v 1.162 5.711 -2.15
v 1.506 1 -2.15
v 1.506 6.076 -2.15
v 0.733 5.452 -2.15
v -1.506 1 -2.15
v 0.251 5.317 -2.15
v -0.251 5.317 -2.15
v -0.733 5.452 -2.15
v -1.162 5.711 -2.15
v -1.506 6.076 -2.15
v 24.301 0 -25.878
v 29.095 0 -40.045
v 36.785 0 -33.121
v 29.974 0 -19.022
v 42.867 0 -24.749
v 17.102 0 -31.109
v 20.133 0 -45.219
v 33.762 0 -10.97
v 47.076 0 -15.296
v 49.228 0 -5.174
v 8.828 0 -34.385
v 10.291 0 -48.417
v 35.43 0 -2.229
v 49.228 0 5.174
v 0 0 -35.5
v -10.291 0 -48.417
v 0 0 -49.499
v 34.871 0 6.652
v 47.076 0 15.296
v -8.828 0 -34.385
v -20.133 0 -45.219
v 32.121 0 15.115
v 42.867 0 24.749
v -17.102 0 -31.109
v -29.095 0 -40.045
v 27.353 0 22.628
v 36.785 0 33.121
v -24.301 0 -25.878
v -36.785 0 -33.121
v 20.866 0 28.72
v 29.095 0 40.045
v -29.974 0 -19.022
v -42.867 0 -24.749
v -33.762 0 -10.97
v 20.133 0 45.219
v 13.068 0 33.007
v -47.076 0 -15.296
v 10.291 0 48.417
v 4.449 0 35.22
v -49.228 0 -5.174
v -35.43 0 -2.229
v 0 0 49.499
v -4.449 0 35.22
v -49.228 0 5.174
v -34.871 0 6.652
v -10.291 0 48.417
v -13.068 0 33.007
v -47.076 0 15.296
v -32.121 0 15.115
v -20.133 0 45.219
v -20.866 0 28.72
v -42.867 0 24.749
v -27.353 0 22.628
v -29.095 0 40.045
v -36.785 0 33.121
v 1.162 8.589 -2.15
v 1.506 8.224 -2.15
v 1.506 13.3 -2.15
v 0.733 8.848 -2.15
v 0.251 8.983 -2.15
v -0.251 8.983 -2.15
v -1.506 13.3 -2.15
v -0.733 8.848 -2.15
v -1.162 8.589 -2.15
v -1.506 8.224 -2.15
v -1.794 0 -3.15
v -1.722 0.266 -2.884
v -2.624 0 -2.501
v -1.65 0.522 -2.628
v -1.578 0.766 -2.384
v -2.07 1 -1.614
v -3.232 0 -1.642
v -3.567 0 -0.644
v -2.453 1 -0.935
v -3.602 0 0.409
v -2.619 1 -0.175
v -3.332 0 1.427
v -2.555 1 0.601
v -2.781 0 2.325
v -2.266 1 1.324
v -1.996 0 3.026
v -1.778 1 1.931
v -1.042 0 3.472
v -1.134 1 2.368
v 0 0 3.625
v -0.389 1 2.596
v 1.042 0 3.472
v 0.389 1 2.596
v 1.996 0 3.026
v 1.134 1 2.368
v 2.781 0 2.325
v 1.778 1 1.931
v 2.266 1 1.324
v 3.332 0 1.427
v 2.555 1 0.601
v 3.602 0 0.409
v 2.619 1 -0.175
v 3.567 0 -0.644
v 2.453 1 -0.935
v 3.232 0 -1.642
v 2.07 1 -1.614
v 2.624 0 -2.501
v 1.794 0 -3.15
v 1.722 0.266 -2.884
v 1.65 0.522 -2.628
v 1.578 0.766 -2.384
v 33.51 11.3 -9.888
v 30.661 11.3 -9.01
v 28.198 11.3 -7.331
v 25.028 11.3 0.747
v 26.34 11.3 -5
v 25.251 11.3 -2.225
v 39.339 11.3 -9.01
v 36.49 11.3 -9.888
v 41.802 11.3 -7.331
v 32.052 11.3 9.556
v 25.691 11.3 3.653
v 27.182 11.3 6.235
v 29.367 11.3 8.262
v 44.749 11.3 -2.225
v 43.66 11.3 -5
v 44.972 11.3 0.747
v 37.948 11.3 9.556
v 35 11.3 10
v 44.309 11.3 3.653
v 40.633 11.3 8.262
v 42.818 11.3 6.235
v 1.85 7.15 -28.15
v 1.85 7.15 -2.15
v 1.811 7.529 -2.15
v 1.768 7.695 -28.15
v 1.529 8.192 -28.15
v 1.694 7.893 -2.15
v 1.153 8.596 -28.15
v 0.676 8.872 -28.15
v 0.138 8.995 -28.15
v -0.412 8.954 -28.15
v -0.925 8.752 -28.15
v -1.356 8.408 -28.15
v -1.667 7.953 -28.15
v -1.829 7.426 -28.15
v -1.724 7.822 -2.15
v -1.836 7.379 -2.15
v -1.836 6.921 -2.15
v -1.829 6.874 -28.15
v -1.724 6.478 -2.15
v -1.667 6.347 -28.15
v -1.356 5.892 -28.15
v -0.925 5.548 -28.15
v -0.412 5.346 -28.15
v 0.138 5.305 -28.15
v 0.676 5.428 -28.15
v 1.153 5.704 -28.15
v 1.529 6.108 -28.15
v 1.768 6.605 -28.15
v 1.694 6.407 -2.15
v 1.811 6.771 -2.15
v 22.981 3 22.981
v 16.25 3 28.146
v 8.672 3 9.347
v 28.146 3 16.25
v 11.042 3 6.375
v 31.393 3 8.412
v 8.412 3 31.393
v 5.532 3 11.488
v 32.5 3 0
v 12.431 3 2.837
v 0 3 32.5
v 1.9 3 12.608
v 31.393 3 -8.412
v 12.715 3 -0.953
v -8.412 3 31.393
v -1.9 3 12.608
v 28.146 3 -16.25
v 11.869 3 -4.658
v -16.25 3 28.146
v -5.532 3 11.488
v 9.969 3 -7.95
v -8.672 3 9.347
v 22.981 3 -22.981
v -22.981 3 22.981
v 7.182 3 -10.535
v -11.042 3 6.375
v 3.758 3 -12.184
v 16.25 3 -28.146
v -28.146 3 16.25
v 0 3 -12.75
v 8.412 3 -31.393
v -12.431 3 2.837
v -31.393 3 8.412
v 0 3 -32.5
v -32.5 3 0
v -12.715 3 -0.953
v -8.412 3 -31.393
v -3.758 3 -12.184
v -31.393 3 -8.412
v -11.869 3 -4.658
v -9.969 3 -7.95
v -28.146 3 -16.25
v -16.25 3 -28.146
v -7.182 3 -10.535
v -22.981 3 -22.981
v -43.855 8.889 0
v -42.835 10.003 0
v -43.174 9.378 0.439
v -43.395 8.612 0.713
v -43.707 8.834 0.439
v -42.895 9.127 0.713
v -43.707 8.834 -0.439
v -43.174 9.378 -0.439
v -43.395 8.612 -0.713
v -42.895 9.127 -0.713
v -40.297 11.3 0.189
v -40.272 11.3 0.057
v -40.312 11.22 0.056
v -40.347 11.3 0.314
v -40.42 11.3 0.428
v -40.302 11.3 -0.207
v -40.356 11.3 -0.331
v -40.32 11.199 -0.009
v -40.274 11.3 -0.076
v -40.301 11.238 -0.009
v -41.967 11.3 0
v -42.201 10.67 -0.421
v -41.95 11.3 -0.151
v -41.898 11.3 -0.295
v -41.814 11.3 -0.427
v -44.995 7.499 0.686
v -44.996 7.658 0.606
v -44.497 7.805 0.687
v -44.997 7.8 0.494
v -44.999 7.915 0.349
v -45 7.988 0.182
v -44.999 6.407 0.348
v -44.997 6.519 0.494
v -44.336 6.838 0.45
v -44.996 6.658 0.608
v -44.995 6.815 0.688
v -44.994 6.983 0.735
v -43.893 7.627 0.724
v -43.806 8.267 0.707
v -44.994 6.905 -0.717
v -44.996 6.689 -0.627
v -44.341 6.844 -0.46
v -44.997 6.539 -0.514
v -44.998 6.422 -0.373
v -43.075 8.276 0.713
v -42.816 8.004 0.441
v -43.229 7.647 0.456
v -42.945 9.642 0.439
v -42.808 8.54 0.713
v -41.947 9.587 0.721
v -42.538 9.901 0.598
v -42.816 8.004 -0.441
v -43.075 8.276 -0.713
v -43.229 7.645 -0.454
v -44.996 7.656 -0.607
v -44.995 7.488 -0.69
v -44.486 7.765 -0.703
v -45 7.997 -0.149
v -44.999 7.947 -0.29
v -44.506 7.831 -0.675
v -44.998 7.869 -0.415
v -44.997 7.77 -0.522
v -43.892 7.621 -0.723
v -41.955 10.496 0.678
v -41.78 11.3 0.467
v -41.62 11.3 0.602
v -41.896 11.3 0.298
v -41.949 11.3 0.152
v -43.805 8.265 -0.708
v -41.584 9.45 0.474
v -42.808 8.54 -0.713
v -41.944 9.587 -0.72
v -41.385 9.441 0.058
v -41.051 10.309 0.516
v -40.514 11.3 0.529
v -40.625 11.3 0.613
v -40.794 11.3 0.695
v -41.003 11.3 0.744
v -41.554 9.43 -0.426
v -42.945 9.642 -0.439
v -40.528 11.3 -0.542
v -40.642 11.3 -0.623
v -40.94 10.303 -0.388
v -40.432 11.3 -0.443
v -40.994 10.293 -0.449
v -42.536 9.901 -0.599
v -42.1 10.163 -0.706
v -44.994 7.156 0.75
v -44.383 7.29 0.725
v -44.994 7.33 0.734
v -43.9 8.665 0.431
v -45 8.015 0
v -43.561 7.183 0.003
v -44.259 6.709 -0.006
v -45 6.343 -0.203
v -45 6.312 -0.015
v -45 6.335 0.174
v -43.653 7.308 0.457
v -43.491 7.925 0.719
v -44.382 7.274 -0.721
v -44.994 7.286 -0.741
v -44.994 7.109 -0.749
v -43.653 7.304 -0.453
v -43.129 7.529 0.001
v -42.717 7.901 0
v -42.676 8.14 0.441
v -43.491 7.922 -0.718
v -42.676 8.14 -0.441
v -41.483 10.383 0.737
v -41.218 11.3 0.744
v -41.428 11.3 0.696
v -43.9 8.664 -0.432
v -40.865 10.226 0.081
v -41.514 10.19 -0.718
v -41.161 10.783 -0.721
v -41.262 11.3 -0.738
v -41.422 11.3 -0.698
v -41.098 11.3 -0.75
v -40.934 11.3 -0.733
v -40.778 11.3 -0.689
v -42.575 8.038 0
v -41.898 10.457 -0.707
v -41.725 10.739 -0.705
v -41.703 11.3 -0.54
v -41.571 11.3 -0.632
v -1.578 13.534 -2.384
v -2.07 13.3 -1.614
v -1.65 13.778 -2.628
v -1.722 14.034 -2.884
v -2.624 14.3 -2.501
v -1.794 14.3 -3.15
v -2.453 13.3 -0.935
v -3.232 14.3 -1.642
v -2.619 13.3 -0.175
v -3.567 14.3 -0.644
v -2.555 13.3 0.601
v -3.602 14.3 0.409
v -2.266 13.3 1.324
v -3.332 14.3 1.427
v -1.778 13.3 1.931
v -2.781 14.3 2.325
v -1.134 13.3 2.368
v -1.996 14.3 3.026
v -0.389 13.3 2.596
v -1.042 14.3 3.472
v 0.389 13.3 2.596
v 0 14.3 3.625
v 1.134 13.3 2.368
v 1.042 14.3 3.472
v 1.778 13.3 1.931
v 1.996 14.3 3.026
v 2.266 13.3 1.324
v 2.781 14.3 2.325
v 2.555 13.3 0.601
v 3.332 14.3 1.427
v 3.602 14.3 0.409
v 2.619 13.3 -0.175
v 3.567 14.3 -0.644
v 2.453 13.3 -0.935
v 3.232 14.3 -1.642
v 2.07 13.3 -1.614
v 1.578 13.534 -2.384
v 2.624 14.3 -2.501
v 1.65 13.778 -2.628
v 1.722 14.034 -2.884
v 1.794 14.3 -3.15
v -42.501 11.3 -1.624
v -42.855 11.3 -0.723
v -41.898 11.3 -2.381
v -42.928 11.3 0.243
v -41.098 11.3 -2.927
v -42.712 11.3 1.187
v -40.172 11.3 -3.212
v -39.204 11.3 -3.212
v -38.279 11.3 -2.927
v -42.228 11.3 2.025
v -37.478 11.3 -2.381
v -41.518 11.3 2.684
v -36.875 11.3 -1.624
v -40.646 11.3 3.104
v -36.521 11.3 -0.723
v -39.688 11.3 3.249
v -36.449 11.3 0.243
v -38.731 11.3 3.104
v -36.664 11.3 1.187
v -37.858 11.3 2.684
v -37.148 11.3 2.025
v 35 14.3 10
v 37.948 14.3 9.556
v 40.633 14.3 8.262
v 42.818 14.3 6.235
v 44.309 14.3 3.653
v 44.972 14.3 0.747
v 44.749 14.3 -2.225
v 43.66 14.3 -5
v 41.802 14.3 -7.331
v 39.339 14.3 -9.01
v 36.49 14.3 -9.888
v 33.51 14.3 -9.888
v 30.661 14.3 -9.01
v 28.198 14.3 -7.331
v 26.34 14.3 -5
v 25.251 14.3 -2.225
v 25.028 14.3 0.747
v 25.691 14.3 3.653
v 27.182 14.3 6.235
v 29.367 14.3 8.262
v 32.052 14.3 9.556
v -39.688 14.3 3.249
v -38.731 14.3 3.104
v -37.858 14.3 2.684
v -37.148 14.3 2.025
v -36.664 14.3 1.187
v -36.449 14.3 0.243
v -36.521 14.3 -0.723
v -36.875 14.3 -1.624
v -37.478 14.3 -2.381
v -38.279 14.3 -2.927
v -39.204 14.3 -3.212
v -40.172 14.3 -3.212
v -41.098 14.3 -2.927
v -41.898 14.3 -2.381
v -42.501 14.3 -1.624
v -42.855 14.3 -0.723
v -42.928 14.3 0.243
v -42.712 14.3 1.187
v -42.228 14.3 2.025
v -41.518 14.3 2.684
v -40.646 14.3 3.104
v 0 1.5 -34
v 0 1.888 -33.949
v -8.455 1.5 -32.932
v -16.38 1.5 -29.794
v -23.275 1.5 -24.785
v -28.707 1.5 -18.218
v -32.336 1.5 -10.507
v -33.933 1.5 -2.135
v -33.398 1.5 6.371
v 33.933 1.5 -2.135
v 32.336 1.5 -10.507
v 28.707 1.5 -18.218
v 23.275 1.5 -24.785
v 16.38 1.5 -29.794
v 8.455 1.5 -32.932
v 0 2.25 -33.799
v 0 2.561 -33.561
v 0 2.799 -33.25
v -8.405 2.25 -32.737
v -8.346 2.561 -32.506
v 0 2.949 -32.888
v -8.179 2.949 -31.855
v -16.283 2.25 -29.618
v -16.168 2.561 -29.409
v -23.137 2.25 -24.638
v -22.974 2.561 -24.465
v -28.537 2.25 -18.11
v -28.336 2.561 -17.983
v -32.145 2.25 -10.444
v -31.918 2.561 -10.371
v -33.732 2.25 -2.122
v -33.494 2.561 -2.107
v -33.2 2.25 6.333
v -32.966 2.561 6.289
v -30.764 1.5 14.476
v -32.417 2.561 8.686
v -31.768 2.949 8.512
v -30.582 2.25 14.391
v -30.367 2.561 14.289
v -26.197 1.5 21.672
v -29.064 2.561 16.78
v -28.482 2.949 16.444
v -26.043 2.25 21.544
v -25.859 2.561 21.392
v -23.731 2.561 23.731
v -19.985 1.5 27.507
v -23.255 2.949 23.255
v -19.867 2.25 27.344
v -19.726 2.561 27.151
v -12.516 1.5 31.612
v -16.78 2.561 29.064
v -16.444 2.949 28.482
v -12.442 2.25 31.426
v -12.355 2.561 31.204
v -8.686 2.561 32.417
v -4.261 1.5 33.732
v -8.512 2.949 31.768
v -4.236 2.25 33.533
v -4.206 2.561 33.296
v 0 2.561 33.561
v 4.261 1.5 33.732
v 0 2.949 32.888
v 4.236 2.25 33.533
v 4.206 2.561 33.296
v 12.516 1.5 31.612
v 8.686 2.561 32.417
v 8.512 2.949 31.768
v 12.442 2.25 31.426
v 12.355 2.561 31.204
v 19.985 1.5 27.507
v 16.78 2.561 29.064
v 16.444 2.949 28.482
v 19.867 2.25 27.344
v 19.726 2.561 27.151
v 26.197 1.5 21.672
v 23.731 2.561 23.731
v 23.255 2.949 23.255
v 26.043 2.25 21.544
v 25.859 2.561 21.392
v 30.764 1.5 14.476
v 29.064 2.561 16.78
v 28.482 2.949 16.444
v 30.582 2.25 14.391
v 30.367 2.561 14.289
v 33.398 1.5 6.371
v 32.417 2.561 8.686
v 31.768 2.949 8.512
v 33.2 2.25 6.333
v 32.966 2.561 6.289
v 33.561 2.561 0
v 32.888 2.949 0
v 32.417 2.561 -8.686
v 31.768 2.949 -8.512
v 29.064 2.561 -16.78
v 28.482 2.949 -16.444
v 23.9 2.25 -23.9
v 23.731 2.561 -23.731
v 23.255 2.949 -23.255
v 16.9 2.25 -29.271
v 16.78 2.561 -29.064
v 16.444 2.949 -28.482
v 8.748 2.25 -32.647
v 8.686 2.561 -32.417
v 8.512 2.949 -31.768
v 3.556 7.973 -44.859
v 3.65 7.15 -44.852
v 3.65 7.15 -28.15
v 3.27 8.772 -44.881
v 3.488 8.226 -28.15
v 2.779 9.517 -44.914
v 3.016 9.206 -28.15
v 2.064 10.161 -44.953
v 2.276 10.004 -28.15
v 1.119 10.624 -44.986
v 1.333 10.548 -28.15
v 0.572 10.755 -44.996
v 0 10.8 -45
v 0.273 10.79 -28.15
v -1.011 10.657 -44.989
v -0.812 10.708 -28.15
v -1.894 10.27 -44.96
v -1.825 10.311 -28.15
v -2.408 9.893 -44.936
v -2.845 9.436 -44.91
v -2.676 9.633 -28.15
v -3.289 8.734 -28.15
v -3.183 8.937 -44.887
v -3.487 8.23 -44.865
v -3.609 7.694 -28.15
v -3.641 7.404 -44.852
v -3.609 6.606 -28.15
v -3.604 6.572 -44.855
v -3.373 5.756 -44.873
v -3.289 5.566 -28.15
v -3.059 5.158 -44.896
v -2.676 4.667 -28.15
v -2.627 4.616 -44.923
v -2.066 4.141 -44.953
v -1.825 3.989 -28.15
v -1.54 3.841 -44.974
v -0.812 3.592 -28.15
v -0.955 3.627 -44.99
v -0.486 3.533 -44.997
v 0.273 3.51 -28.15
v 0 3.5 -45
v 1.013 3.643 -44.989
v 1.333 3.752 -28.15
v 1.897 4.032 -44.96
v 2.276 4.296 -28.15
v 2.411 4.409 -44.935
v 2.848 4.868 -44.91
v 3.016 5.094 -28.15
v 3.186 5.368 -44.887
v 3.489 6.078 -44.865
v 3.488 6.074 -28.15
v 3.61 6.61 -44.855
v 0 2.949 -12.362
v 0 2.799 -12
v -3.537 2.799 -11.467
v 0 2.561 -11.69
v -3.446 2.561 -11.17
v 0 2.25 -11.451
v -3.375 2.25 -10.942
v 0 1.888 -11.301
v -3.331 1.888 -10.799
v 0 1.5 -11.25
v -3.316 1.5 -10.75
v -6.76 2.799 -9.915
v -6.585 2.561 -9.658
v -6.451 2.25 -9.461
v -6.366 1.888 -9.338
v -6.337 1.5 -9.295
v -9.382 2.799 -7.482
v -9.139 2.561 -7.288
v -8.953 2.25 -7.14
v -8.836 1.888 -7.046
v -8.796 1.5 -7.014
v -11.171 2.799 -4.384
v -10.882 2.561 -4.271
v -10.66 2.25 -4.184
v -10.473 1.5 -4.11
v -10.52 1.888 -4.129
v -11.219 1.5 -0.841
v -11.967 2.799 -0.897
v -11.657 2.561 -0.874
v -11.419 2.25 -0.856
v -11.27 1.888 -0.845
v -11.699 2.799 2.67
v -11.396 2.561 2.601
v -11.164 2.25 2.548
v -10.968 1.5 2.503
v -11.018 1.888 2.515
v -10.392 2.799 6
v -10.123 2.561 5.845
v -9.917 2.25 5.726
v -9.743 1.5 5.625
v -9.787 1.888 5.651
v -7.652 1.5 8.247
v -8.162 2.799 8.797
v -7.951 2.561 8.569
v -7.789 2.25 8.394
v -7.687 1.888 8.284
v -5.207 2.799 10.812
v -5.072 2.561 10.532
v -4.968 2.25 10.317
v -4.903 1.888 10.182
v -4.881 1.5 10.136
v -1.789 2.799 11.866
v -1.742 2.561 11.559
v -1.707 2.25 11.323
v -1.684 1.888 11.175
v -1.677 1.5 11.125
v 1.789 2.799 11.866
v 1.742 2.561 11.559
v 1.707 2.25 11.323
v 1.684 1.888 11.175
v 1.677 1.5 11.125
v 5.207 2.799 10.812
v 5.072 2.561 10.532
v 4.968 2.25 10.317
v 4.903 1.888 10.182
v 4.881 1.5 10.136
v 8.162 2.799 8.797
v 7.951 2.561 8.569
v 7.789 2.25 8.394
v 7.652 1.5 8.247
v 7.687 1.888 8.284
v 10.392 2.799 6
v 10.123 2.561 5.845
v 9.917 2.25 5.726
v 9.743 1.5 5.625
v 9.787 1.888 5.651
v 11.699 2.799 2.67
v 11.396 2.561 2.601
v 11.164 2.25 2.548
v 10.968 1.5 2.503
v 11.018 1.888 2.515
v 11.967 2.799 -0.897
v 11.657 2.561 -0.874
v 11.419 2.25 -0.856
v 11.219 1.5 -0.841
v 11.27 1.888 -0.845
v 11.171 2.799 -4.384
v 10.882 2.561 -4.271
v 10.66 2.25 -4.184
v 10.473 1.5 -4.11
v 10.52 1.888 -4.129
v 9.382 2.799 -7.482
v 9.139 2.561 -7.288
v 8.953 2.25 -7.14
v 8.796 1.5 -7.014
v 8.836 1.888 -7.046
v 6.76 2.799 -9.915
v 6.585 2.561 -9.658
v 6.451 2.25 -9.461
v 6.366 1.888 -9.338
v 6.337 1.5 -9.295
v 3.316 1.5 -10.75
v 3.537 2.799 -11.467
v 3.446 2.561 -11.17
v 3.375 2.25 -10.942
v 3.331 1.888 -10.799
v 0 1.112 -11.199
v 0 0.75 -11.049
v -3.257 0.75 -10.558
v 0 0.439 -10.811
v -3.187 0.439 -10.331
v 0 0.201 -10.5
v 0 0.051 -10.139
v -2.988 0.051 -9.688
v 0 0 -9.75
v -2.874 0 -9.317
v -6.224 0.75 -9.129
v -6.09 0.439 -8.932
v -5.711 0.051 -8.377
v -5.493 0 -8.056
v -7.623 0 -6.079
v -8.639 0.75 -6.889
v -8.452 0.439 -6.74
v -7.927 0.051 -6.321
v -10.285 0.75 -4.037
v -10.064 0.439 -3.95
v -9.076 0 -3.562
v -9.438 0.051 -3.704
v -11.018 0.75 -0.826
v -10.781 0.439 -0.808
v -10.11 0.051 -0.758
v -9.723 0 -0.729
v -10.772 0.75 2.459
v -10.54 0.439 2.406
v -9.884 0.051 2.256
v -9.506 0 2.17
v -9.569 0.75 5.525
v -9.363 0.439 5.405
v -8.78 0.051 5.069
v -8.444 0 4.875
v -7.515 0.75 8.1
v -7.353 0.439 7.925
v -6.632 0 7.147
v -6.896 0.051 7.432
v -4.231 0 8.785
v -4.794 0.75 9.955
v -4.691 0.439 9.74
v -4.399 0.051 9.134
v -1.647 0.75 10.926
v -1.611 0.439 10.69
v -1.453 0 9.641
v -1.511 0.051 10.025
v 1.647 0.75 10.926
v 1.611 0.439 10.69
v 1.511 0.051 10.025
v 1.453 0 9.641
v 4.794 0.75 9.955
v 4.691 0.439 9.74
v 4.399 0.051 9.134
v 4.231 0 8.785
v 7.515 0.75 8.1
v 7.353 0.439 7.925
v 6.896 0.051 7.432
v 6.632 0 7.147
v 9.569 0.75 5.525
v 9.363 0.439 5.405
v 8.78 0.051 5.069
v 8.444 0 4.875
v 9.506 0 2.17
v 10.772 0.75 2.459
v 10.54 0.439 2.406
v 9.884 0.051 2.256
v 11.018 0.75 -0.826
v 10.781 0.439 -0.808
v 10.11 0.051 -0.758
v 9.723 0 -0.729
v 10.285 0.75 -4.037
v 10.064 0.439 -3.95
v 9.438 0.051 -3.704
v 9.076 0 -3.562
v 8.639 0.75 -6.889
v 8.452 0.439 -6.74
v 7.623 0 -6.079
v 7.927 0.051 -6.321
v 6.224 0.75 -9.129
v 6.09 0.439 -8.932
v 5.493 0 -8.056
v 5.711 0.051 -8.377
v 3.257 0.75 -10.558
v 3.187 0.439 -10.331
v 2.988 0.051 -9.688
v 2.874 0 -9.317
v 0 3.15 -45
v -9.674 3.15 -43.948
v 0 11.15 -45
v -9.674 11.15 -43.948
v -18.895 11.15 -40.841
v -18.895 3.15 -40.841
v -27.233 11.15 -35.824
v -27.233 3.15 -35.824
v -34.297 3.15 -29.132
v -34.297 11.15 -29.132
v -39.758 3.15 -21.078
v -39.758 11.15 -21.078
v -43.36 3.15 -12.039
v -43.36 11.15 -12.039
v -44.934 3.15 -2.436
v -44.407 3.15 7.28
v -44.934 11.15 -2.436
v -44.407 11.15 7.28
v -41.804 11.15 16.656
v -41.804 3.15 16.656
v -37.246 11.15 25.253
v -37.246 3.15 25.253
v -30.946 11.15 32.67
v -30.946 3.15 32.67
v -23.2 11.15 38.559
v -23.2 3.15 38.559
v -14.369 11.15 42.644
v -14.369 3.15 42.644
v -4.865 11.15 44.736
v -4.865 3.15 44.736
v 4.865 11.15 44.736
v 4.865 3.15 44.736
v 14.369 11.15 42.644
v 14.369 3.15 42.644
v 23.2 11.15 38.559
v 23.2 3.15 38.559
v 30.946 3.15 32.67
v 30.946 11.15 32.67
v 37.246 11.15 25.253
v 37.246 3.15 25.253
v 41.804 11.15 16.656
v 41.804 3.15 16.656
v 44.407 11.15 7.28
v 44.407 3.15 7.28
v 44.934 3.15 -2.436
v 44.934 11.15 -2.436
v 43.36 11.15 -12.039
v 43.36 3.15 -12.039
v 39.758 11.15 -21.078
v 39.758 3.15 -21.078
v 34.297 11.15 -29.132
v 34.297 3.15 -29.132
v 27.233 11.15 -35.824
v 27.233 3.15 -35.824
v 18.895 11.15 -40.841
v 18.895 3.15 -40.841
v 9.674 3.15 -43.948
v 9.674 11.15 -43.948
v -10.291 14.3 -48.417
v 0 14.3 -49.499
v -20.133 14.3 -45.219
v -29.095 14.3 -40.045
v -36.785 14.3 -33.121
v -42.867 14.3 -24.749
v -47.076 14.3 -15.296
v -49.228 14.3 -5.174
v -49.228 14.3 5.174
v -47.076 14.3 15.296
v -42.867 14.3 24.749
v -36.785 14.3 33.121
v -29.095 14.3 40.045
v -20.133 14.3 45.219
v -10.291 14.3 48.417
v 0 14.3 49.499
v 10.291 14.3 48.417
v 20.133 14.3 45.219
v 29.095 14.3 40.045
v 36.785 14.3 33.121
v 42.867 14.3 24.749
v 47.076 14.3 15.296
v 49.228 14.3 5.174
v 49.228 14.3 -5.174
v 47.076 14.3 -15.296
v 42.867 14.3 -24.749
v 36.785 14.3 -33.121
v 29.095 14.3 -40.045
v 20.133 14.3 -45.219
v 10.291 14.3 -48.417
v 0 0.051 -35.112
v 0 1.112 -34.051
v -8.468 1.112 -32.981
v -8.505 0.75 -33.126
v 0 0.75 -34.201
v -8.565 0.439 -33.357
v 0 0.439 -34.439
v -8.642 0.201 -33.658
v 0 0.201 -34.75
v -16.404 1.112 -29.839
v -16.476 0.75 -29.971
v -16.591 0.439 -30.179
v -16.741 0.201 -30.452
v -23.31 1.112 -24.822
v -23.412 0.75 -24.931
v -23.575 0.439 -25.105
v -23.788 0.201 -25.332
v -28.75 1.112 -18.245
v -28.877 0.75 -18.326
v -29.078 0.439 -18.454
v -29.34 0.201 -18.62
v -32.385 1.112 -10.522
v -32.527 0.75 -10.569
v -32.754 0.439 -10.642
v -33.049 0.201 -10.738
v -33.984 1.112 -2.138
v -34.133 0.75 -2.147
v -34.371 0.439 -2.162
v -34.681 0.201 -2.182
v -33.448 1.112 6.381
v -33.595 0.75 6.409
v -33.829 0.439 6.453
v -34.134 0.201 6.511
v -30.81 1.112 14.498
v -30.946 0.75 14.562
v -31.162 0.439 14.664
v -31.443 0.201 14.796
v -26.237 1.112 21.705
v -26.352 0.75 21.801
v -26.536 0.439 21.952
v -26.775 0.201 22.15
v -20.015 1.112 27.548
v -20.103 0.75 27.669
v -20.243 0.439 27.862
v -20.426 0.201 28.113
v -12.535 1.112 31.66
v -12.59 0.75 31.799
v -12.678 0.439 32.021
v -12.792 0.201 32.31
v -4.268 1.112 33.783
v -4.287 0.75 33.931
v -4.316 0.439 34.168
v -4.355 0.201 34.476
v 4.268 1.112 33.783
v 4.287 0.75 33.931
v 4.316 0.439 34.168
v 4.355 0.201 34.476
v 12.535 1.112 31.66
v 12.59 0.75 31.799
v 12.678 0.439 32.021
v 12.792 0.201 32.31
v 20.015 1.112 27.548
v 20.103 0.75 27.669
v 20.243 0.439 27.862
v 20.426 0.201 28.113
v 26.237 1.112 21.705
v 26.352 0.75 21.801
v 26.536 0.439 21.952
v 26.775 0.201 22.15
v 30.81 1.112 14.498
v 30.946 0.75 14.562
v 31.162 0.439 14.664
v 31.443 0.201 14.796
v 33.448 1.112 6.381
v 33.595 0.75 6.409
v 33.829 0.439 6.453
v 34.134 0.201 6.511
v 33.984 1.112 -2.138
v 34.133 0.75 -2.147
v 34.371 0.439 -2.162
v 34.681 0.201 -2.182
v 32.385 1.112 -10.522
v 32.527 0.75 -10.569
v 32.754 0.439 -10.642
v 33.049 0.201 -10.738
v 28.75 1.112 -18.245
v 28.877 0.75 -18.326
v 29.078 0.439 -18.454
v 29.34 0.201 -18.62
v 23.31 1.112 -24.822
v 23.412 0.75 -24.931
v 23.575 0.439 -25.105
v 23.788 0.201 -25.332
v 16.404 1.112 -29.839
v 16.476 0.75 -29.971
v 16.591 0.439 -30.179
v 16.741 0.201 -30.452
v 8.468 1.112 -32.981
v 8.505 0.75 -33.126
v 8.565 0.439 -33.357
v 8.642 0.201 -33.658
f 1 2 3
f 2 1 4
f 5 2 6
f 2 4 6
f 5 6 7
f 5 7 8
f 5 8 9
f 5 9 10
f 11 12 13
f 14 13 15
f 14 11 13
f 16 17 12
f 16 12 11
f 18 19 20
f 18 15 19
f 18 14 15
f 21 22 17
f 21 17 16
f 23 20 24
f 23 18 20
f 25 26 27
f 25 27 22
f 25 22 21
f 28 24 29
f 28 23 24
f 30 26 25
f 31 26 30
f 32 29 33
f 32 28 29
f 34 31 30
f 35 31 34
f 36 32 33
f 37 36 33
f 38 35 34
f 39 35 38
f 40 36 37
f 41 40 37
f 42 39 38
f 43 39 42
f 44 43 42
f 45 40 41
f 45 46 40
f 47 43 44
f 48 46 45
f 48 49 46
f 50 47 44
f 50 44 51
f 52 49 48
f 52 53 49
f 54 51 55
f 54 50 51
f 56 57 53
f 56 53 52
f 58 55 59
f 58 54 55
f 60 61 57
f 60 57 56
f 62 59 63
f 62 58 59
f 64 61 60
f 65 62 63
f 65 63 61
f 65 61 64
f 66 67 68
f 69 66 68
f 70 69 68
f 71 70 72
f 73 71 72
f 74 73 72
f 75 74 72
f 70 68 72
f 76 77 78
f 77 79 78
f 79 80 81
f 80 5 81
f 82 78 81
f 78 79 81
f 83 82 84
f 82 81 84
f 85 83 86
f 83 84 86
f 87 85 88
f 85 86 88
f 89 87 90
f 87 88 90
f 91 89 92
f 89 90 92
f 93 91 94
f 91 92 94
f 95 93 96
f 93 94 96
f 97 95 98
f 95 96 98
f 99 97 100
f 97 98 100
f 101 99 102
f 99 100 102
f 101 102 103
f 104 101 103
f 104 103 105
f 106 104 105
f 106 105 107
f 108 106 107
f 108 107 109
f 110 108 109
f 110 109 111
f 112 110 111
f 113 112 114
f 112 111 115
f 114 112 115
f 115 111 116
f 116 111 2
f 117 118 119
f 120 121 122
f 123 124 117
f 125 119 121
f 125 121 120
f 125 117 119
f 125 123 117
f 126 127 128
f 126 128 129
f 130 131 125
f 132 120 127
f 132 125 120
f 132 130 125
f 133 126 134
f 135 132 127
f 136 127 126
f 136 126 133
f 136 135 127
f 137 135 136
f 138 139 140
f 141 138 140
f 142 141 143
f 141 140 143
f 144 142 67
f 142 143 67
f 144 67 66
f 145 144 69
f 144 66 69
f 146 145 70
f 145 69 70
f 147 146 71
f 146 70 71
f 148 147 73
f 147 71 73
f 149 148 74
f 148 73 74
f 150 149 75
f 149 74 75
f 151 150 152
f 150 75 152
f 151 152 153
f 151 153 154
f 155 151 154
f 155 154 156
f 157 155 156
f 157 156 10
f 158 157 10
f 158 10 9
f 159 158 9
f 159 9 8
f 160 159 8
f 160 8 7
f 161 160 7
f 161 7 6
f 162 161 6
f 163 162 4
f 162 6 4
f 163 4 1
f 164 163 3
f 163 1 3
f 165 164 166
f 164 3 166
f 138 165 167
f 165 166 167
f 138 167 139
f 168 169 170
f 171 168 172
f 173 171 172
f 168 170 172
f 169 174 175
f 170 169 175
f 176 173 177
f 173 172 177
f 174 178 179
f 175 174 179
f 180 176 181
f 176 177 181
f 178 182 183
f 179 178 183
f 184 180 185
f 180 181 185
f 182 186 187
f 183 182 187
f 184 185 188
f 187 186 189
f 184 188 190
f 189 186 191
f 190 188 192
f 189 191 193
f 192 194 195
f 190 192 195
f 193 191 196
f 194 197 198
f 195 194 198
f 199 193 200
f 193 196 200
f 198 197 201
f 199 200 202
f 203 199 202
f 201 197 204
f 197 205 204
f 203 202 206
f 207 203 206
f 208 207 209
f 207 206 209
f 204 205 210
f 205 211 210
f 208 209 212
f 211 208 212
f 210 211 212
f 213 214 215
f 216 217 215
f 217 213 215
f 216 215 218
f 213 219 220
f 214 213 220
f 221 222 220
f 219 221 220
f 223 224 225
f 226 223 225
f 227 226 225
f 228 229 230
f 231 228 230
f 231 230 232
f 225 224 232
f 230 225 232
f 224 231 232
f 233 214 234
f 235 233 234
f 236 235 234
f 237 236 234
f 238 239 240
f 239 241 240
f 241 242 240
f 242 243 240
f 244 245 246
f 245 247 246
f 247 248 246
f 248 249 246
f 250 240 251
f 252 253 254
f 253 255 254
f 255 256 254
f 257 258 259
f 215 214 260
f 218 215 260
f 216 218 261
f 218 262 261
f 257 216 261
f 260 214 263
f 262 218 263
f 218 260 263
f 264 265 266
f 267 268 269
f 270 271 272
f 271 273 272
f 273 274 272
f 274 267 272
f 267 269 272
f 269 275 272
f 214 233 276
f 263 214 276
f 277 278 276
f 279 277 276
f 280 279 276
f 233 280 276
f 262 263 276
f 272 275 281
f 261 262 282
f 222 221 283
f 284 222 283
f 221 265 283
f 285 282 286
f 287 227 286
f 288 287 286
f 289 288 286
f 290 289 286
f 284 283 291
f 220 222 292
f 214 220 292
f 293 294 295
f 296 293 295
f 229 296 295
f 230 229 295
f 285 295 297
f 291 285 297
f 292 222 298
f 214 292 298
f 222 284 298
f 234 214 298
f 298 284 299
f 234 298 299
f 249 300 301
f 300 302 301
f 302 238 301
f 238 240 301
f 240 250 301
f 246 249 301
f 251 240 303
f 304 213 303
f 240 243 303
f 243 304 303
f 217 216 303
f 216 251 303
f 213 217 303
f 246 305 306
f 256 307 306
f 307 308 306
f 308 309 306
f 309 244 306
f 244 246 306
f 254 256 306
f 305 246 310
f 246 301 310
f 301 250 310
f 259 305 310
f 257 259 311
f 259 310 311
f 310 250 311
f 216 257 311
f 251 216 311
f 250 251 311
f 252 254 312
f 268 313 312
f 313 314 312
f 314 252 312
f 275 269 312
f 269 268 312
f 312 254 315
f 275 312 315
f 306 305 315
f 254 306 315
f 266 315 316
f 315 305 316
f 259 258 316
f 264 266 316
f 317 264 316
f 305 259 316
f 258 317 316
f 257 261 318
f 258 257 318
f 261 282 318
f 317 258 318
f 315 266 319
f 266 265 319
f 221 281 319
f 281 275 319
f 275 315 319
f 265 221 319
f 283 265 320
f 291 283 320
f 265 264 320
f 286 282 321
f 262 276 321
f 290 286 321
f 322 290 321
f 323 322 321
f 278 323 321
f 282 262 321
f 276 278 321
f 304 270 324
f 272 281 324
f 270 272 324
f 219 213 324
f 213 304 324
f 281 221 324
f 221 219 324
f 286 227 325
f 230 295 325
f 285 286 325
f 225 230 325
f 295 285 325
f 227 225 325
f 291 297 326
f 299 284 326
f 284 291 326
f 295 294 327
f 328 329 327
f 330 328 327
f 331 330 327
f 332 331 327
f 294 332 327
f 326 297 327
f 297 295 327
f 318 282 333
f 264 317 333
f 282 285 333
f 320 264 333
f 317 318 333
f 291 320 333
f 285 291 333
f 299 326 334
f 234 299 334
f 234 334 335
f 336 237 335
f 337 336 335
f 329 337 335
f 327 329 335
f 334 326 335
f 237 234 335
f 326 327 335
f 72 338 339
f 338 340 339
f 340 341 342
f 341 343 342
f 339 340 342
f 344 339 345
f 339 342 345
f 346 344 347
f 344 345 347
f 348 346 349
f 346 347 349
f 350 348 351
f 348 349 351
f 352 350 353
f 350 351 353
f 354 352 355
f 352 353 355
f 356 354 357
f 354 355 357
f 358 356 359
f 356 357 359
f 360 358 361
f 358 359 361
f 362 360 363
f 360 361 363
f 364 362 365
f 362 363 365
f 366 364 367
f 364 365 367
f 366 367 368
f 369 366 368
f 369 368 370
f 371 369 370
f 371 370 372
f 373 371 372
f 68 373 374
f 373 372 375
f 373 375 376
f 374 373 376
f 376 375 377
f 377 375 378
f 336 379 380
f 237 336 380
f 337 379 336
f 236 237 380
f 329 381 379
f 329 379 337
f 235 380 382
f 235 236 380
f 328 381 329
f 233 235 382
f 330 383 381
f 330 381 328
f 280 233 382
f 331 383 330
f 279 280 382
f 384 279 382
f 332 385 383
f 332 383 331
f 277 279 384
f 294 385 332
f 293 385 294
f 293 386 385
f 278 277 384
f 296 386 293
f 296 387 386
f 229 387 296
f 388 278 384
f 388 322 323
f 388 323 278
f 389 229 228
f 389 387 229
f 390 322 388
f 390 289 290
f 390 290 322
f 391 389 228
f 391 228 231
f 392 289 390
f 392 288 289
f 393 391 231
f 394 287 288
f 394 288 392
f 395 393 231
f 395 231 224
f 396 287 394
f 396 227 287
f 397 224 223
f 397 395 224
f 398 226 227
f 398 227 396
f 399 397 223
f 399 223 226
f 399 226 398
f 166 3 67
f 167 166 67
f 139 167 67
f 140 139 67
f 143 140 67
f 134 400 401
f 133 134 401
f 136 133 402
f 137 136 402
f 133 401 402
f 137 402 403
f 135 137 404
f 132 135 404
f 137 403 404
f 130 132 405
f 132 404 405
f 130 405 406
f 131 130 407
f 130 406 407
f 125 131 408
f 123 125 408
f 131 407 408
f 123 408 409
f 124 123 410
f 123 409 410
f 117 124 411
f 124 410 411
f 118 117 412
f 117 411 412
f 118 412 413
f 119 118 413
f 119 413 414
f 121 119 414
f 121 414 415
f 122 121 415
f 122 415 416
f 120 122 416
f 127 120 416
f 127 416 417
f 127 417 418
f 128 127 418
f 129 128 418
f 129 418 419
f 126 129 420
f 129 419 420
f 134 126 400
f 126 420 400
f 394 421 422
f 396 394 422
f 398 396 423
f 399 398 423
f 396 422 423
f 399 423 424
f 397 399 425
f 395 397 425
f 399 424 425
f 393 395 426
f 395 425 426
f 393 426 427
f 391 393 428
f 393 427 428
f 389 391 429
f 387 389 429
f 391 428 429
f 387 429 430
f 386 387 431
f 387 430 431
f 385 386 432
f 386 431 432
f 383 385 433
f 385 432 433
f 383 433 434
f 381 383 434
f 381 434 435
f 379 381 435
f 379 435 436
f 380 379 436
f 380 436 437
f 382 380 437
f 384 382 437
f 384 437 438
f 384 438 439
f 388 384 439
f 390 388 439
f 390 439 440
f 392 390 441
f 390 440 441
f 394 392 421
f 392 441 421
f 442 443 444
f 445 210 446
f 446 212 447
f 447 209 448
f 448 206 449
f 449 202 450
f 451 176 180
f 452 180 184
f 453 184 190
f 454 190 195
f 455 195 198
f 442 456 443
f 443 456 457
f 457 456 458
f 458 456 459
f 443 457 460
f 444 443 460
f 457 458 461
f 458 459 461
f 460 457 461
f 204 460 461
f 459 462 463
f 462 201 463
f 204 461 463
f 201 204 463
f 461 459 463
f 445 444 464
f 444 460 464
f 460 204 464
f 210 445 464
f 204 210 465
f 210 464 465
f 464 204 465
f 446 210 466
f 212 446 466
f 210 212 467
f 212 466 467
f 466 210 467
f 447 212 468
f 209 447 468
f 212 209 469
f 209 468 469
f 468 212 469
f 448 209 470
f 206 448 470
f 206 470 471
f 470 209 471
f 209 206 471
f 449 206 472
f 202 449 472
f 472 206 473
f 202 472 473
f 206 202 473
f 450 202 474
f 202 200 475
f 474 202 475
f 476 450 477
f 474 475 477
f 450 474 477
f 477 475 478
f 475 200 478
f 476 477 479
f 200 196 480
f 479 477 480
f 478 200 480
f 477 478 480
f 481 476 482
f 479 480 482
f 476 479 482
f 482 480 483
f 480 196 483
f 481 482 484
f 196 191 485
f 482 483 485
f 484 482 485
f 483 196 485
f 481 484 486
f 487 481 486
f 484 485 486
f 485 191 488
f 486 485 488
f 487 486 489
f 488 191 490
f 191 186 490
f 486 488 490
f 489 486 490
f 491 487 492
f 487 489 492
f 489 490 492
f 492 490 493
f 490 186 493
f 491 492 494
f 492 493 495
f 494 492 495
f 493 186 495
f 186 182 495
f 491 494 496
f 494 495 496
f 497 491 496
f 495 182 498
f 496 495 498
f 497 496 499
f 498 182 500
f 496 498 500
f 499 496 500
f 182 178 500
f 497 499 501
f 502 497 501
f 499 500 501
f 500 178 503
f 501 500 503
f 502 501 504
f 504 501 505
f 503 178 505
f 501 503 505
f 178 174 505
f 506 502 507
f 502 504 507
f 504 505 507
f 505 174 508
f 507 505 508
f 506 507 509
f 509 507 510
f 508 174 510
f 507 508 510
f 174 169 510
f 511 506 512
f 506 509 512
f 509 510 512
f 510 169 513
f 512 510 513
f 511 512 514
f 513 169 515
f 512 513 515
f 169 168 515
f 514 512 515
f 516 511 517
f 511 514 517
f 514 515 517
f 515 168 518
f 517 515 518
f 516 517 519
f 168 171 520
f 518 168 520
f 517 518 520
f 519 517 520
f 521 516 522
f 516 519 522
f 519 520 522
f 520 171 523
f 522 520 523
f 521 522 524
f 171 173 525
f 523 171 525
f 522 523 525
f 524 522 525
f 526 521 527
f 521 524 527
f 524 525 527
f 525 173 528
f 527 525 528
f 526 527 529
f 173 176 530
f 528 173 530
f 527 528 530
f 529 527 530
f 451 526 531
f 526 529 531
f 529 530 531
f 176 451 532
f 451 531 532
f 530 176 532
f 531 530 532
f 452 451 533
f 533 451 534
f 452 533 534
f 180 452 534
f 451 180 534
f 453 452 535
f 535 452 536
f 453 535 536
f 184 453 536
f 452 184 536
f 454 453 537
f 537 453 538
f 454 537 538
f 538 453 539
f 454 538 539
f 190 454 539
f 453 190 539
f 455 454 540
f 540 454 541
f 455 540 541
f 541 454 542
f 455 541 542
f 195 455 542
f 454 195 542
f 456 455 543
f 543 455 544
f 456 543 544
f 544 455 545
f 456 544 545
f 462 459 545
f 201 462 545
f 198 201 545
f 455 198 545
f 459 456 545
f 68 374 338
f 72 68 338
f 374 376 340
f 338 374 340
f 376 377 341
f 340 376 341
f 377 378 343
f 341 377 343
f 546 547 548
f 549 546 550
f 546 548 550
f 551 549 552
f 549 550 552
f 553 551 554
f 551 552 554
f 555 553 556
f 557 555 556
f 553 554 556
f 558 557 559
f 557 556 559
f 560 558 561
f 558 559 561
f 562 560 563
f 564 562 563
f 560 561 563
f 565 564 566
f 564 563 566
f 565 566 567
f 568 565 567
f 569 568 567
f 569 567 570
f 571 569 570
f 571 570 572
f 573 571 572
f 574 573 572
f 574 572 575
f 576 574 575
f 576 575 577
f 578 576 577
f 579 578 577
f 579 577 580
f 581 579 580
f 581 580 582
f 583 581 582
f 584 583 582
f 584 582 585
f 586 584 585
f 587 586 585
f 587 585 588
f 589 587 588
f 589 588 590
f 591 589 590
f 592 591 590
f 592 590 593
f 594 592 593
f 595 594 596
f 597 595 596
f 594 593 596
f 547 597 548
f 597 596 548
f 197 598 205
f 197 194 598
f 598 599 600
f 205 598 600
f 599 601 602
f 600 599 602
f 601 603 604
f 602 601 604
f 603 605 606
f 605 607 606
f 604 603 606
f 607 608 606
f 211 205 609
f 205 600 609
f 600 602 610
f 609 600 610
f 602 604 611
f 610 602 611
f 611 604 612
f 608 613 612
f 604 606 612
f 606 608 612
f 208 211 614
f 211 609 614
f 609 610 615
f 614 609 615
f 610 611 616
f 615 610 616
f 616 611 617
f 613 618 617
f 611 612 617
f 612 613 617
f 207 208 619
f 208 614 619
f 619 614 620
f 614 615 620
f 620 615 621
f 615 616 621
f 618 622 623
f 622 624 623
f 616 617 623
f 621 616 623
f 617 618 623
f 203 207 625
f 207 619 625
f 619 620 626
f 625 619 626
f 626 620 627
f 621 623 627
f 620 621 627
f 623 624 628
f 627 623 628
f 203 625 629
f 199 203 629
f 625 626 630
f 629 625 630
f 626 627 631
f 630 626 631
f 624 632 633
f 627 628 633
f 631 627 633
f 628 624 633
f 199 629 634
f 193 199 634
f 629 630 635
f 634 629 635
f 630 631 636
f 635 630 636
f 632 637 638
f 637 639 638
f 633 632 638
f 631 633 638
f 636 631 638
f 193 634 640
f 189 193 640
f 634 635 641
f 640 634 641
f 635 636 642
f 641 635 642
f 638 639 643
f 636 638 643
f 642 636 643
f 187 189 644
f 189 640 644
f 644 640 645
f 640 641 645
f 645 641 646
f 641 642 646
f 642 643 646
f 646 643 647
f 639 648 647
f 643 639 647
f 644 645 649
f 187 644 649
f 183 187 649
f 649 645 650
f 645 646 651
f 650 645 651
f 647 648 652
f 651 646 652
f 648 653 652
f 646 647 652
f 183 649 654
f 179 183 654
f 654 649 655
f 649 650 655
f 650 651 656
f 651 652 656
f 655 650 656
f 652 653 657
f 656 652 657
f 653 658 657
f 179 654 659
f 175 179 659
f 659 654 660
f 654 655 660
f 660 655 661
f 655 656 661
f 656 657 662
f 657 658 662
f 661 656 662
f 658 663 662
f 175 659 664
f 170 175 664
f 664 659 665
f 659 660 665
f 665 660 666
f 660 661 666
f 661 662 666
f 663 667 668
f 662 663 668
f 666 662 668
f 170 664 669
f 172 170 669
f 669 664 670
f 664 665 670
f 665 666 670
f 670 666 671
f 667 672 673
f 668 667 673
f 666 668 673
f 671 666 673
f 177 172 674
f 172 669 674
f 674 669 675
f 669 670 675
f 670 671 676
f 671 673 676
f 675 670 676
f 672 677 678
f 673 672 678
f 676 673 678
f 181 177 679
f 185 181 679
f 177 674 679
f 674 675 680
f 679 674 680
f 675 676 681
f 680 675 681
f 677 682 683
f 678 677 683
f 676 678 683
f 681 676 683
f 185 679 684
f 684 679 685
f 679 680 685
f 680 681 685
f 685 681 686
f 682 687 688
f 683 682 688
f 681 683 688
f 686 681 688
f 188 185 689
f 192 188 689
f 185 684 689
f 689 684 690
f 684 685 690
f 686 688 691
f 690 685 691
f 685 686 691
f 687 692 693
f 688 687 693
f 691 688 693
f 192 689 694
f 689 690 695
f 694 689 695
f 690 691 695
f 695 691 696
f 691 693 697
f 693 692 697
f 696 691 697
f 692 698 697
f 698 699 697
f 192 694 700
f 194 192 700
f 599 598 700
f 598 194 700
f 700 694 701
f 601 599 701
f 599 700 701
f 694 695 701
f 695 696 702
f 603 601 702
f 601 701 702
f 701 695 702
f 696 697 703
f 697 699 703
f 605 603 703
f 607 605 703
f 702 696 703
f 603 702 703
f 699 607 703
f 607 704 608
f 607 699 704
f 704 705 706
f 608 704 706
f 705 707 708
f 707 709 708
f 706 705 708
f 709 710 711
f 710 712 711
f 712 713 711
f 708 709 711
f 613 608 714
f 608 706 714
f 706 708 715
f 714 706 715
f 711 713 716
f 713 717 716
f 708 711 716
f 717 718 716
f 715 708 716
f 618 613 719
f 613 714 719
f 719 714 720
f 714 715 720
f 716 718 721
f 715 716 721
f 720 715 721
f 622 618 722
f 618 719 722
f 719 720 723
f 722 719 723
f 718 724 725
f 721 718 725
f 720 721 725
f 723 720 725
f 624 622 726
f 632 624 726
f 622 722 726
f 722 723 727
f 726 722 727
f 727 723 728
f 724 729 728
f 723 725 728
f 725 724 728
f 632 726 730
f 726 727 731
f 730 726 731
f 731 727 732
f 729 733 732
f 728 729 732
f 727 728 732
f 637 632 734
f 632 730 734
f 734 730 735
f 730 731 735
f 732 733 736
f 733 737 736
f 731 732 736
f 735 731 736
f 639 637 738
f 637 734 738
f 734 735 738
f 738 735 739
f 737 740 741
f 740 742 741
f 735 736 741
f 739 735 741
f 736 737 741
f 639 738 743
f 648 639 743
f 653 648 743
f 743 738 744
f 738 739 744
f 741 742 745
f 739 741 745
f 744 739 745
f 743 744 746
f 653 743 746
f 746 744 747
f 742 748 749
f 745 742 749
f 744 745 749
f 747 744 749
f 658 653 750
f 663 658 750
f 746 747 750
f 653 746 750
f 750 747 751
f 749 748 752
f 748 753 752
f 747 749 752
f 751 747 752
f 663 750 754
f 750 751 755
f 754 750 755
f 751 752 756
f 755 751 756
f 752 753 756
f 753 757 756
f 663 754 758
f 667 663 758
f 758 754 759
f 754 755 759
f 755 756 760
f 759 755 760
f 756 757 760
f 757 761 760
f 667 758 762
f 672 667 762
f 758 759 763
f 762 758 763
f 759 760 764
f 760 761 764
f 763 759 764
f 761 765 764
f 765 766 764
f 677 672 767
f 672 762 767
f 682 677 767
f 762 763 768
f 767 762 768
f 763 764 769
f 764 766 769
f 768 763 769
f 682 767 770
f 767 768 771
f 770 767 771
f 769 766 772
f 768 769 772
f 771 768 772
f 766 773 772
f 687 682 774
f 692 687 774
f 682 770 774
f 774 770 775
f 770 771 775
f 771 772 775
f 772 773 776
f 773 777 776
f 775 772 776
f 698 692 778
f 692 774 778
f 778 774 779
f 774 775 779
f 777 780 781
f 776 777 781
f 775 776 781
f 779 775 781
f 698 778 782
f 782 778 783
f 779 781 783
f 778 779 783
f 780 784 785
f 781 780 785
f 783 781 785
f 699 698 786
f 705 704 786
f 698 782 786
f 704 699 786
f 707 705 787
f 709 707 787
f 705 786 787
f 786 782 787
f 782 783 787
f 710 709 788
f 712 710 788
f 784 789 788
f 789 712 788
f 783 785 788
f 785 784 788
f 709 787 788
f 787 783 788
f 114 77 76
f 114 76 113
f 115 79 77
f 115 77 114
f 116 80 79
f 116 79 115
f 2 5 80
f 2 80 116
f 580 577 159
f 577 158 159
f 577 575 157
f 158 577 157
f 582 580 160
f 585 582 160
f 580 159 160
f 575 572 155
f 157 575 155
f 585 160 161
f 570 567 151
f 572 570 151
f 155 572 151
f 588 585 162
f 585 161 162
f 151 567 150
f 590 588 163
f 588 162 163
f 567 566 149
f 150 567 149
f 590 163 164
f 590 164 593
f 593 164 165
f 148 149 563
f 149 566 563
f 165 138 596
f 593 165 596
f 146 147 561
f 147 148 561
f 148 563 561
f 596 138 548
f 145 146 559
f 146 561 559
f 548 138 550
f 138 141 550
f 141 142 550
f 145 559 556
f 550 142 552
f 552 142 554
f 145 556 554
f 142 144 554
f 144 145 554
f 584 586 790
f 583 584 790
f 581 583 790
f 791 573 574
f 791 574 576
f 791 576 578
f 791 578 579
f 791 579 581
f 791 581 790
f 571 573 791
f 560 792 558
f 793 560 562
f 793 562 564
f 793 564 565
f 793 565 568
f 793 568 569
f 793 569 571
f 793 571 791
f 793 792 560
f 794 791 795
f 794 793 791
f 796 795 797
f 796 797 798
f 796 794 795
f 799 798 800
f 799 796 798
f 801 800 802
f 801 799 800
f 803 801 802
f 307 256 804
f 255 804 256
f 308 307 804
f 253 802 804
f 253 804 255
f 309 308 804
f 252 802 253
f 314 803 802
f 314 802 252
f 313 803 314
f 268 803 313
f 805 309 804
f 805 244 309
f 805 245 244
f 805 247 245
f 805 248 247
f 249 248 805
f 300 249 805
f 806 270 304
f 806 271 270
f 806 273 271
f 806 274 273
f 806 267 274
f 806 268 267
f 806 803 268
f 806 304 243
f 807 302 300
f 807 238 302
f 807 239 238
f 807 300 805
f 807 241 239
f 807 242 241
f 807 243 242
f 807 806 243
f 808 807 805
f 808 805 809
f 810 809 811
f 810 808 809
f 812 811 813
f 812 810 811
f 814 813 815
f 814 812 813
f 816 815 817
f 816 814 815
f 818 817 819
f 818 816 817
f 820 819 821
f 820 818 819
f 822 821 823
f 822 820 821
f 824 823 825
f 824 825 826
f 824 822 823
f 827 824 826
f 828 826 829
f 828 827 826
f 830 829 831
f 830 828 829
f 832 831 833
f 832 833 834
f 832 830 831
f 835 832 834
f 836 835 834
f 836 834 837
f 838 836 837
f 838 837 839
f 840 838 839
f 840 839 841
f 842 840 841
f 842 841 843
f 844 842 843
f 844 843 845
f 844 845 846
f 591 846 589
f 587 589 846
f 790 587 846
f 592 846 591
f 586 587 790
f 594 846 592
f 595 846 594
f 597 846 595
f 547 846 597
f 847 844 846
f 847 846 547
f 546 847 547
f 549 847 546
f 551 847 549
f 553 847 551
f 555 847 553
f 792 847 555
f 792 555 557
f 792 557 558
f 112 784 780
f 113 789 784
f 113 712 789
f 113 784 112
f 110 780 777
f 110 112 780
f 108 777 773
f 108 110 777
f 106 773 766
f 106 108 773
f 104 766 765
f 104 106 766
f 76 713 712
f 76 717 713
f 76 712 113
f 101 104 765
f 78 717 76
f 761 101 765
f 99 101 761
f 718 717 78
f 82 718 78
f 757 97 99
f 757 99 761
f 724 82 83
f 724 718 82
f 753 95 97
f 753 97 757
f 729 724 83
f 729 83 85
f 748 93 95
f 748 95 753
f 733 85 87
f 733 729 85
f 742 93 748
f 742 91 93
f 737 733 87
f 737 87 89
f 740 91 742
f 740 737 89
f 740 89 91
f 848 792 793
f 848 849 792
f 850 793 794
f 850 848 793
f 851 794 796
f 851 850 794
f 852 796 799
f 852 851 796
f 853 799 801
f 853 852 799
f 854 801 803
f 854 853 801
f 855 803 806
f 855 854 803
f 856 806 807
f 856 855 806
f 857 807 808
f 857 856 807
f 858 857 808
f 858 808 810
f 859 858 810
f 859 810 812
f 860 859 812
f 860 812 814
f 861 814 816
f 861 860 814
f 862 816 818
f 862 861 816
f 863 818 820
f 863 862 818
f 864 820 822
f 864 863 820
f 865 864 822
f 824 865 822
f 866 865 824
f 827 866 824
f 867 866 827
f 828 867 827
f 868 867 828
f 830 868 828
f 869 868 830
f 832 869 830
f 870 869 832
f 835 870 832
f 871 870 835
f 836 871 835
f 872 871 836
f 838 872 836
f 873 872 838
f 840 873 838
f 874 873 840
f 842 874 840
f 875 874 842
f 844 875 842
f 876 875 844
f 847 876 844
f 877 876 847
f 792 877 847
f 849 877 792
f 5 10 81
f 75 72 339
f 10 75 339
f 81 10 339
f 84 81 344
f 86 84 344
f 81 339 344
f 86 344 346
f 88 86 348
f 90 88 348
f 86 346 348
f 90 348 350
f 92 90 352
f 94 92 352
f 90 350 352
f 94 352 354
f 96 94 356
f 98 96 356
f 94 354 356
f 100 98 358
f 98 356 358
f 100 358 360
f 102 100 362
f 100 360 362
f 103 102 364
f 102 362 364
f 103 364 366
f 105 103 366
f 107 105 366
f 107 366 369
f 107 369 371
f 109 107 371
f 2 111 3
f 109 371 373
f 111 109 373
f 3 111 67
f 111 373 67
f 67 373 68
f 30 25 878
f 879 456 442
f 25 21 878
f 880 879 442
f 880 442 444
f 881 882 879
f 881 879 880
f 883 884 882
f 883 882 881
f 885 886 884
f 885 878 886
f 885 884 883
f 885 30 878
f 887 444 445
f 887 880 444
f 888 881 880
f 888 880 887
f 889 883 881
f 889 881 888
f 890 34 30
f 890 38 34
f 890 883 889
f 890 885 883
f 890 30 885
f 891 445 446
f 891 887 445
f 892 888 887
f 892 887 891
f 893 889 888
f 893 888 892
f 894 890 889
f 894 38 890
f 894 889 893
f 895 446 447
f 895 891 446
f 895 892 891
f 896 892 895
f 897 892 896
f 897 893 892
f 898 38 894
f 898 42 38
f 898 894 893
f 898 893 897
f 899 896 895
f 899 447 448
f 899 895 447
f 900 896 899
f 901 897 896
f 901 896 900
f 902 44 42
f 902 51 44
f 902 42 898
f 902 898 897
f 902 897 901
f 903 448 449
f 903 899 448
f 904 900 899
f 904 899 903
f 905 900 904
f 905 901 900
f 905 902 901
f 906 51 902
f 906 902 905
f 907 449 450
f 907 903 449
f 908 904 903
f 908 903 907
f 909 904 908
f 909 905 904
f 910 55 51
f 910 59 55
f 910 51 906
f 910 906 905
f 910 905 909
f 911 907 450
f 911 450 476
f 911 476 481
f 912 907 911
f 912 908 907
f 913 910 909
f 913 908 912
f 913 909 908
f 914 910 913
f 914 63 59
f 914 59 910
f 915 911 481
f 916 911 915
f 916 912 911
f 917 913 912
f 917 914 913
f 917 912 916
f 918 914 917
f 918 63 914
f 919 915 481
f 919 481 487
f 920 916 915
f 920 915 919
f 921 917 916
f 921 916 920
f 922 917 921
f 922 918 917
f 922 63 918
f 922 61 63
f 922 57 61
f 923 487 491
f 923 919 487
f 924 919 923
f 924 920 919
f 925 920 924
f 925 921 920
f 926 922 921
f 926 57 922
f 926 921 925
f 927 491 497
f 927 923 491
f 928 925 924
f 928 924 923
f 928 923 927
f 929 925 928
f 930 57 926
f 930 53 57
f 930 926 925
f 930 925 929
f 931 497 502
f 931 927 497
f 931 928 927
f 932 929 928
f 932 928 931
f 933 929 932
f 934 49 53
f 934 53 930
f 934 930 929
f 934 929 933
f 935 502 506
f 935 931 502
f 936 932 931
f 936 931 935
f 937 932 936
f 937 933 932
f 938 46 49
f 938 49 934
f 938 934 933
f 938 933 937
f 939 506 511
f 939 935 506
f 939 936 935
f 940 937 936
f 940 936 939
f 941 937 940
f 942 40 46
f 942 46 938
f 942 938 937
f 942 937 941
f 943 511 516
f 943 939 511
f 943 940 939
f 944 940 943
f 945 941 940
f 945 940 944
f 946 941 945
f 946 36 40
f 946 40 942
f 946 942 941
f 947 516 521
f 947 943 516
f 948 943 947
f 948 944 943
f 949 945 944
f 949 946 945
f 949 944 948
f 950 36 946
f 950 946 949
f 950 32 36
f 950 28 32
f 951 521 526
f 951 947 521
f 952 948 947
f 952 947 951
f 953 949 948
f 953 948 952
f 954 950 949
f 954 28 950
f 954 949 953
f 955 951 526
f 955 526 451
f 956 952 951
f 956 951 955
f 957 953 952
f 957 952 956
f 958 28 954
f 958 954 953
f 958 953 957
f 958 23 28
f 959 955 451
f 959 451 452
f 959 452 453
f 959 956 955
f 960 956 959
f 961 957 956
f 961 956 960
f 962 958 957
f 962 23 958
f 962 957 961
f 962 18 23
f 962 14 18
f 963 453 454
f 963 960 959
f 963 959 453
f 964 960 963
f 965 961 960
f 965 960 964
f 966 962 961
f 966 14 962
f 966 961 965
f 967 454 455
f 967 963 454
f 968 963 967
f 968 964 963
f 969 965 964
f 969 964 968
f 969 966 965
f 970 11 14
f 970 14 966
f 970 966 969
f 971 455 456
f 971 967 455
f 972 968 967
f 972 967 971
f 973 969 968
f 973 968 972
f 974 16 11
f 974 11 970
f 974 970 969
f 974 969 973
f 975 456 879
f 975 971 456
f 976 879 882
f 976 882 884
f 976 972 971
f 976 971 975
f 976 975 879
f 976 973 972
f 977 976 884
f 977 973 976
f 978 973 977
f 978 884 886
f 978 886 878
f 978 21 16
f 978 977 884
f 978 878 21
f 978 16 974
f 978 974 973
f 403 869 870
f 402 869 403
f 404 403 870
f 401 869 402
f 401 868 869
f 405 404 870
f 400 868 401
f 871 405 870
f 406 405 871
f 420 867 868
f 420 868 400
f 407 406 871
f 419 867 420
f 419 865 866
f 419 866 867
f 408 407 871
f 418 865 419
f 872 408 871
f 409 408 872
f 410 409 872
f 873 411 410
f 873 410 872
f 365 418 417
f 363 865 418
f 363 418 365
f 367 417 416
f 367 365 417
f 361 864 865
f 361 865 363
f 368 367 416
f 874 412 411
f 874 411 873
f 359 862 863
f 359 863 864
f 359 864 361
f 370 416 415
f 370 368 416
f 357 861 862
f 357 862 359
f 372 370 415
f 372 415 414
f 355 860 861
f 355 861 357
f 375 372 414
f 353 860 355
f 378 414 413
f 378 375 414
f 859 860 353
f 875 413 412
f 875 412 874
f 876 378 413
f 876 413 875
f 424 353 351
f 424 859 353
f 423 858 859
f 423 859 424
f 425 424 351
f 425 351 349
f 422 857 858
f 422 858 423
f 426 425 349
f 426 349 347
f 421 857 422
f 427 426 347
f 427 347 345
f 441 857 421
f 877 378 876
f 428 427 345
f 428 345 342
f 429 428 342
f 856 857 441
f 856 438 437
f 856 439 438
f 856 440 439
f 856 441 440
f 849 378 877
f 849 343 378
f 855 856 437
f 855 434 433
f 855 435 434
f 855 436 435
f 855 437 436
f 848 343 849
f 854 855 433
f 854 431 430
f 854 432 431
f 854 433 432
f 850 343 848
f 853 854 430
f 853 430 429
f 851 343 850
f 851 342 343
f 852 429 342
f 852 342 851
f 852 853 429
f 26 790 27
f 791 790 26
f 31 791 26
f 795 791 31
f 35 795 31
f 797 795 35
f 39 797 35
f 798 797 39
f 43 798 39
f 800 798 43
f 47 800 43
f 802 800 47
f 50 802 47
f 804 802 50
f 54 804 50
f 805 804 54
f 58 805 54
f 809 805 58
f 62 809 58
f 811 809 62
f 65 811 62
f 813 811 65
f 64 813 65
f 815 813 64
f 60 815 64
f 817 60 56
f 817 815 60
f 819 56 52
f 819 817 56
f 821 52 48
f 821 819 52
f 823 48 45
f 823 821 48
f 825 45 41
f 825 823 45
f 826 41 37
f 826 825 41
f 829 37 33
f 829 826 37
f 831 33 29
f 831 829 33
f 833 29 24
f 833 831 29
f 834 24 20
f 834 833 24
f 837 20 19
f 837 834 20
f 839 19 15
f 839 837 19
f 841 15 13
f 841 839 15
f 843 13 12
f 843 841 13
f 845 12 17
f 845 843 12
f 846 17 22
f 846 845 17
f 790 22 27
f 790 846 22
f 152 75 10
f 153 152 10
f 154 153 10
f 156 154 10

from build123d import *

# Parameters (mm, degrees)
CUT_EXTRUDE2_DEPTH   = 27
CHAMFER2_SIZE        = 1
CUT_SWEEP1_PROFILE_R = 0.75
SKETCH24_R           = 3.248561068
CUT_EXTRUDE7_DEPTH   = 3
SKETCH32_R           = 10
CUT_EXTRUDE9_DEPTH   = 3
SKETCH33_R           = 1.85
CUT_EXTRUDE10_DEPTH  = 26
SKETCH34_R           = 3.65
CUT_EXTRUDE11_DEPTH  = 26
CUT_EXTRUDE13_START  = -14.3
SKETCH26_R           = 34
SKETCH26_R_2         = 11.250223146
CUT_EXTRUDE13_DEPTH  = 3
FILLET1_R            = 1.5


with BuildPart() as part:
    # Sketch2 → Revolve1 (revolve)
    with BuildSketch(Plane.XY, mode=Mode.PRIVATE) as revolve1_sk:
        Polygon((0, 0), (-49.498666221, 0), (-45, 3.15), (-45, 11.15), (-49.498666221, 14.3), (0, 14.3), align=None)
    revolve(revolve1_sk.sketch.rotate(Axis((0, 0, 0), (0, 1, 0)), 270), axis=Axis((0, 0, 0), (0, 1, 0)))

    # Sketch4 → Cut-Extrude2 (cut)
    with BuildSketch(Plane(origin=(0, 14.3, 0), x_dir=(1, 0, 0), z_dir=(0, 1, 0))):
        with BuildLine():
            Line((1.506029548, 2.15), (-1.506029548, 2.15))
            ThreePointArc((-1.506029548, 2.15), (0, -2.625), (1.506029548, 2.15))
        make_face()
    extrude(amount=-CUT_EXTRUDE2_DEPTH, mode=Mode.SUBTRACT)

    # Chamfer2
    chamfer2_edges = [part.edges().sort_by_distance(p)[0] for p in [
        (0, 0, 2.625),
        (0, 0, -2.15),
        (0, 14.3, 2.625),
        (0, 14.3, -2.15),
    ]]
    chamfer(chamfer2_edges, length=CHAMFER2_SIZE)

    # Cut-Sweep1: sweep along a path in Sketch9
    with BuildLine() as cut_sweep1_path:  # in the path sketch's own coordinates; laid on its plane below (add() does not lay a ready-made edge on the line's plane)
        add(Edge.make_bspline(
            [(-51.805130379, 7.70415138), (-45.151420928, 3.291923868), (-39.633758445, 11.086700009), (-39.716744994, 16.706140497)],
            knots=[0, 0, 0, 0, 1, 1, 1, 1], degree=3))
    # Cut-Sweep1 profile (on start of the path) → Cut-Sweep1 (sweep, cut)
    with BuildSketch(Plane(origin=(-51.805130379, 7.70415138, 0), x_dir=(0.5526538855740072, 0.8334108727152246, 0), z_dir=(0.8334108727152246, -0.5526538855740072, 0))):
        Circle(CUT_SWEEP1_PROFILE_R)
    sweep(path=Plane.XY * cut_sweep1_path.line, mode=Mode.SUBTRACT)

    # Sketch24 → Cut-Extrude7 (cut)
    with BuildSketch(Plane(origin=(0, 14.3, 0), x_dir=(1, 0, 0), z_dir=(0, 1, 0))):
        with Locations(Location((-39.688079845, 0, 0), (0, 0, 270))):
            Circle(SKETCH24_R)
    extrude(amount=-CUT_EXTRUDE7_DEPTH, mode=Mode.SUBTRACT)

    # Sketch32 → Cut-Extrude9 (cut)
    with BuildSketch(Plane(origin=(0, 14.3, 0), x_dir=(1, 0, 0), z_dir=(0, 1, 0))):
        with Locations(Location((35, 0, 0), (0, 0, 270))):
            Circle(SKETCH32_R)
    extrude(amount=-CUT_EXTRUDE9_DEPTH, mode=Mode.SUBTRACT)

    # Sketch33 → Cut-Extrude10 (cut)
    with BuildSketch(Plane.XY.offset(-2.15)):
        with Locations((0, 7.15)):
            Circle(SKETCH33_R)
    extrude(amount=-CUT_EXTRUDE10_DEPTH, mode=Mode.SUBTRACT)

    # Sketch34 → Cut-Extrude11 (cut)
    with BuildSketch(Plane.XY.offset(-28.15)):
        with Locations((0, 7.15)):
            Circle(SKETCH34_R)
    extrude(amount=-CUT_EXTRUDE11_DEPTH, mode=Mode.SUBTRACT)

    # Sketch26 → Cut-Extrude13 (cut)
    with BuildSketch(Plane(origin=(0, 14.3, 0), x_dir=(1, 0, 0), z_dir=(0, 1, 0)).offset(CUT_EXTRUDE13_START)):
        with Locations(Location((0, 0, 0), (0, 0, 90))):
            Circle(SKETCH26_R)
        with Locations(Location((0, 0, 0), (0, 0, 90))):
            Circle(SKETCH26_R_2, mode=Mode.SUBTRACT)
    extrude(amount=CUT_EXTRUDE13_DEPTH, mode=Mode.SUBTRACT)

    # Fillet1
    fillet1_edges = [part.edges().sort_by_distance(p)[0] for p in [
        (0, 3, 34),
        (0, 3, 11.250223146),
    ]]
    fillet(fillet1_edges, radius=FILLET1_R)
    fillet1_2_edges = [part.edges().sort_by_distance(p)[0] for p in [
        (0, 0, 34),
        (0, 0, 11.250223146),
    ]]
    fillet(fillet1_2_edges, radius=FILLET1_R - 0.0001)  # a hair under: the kernel refuses the full size


solid = part.part
